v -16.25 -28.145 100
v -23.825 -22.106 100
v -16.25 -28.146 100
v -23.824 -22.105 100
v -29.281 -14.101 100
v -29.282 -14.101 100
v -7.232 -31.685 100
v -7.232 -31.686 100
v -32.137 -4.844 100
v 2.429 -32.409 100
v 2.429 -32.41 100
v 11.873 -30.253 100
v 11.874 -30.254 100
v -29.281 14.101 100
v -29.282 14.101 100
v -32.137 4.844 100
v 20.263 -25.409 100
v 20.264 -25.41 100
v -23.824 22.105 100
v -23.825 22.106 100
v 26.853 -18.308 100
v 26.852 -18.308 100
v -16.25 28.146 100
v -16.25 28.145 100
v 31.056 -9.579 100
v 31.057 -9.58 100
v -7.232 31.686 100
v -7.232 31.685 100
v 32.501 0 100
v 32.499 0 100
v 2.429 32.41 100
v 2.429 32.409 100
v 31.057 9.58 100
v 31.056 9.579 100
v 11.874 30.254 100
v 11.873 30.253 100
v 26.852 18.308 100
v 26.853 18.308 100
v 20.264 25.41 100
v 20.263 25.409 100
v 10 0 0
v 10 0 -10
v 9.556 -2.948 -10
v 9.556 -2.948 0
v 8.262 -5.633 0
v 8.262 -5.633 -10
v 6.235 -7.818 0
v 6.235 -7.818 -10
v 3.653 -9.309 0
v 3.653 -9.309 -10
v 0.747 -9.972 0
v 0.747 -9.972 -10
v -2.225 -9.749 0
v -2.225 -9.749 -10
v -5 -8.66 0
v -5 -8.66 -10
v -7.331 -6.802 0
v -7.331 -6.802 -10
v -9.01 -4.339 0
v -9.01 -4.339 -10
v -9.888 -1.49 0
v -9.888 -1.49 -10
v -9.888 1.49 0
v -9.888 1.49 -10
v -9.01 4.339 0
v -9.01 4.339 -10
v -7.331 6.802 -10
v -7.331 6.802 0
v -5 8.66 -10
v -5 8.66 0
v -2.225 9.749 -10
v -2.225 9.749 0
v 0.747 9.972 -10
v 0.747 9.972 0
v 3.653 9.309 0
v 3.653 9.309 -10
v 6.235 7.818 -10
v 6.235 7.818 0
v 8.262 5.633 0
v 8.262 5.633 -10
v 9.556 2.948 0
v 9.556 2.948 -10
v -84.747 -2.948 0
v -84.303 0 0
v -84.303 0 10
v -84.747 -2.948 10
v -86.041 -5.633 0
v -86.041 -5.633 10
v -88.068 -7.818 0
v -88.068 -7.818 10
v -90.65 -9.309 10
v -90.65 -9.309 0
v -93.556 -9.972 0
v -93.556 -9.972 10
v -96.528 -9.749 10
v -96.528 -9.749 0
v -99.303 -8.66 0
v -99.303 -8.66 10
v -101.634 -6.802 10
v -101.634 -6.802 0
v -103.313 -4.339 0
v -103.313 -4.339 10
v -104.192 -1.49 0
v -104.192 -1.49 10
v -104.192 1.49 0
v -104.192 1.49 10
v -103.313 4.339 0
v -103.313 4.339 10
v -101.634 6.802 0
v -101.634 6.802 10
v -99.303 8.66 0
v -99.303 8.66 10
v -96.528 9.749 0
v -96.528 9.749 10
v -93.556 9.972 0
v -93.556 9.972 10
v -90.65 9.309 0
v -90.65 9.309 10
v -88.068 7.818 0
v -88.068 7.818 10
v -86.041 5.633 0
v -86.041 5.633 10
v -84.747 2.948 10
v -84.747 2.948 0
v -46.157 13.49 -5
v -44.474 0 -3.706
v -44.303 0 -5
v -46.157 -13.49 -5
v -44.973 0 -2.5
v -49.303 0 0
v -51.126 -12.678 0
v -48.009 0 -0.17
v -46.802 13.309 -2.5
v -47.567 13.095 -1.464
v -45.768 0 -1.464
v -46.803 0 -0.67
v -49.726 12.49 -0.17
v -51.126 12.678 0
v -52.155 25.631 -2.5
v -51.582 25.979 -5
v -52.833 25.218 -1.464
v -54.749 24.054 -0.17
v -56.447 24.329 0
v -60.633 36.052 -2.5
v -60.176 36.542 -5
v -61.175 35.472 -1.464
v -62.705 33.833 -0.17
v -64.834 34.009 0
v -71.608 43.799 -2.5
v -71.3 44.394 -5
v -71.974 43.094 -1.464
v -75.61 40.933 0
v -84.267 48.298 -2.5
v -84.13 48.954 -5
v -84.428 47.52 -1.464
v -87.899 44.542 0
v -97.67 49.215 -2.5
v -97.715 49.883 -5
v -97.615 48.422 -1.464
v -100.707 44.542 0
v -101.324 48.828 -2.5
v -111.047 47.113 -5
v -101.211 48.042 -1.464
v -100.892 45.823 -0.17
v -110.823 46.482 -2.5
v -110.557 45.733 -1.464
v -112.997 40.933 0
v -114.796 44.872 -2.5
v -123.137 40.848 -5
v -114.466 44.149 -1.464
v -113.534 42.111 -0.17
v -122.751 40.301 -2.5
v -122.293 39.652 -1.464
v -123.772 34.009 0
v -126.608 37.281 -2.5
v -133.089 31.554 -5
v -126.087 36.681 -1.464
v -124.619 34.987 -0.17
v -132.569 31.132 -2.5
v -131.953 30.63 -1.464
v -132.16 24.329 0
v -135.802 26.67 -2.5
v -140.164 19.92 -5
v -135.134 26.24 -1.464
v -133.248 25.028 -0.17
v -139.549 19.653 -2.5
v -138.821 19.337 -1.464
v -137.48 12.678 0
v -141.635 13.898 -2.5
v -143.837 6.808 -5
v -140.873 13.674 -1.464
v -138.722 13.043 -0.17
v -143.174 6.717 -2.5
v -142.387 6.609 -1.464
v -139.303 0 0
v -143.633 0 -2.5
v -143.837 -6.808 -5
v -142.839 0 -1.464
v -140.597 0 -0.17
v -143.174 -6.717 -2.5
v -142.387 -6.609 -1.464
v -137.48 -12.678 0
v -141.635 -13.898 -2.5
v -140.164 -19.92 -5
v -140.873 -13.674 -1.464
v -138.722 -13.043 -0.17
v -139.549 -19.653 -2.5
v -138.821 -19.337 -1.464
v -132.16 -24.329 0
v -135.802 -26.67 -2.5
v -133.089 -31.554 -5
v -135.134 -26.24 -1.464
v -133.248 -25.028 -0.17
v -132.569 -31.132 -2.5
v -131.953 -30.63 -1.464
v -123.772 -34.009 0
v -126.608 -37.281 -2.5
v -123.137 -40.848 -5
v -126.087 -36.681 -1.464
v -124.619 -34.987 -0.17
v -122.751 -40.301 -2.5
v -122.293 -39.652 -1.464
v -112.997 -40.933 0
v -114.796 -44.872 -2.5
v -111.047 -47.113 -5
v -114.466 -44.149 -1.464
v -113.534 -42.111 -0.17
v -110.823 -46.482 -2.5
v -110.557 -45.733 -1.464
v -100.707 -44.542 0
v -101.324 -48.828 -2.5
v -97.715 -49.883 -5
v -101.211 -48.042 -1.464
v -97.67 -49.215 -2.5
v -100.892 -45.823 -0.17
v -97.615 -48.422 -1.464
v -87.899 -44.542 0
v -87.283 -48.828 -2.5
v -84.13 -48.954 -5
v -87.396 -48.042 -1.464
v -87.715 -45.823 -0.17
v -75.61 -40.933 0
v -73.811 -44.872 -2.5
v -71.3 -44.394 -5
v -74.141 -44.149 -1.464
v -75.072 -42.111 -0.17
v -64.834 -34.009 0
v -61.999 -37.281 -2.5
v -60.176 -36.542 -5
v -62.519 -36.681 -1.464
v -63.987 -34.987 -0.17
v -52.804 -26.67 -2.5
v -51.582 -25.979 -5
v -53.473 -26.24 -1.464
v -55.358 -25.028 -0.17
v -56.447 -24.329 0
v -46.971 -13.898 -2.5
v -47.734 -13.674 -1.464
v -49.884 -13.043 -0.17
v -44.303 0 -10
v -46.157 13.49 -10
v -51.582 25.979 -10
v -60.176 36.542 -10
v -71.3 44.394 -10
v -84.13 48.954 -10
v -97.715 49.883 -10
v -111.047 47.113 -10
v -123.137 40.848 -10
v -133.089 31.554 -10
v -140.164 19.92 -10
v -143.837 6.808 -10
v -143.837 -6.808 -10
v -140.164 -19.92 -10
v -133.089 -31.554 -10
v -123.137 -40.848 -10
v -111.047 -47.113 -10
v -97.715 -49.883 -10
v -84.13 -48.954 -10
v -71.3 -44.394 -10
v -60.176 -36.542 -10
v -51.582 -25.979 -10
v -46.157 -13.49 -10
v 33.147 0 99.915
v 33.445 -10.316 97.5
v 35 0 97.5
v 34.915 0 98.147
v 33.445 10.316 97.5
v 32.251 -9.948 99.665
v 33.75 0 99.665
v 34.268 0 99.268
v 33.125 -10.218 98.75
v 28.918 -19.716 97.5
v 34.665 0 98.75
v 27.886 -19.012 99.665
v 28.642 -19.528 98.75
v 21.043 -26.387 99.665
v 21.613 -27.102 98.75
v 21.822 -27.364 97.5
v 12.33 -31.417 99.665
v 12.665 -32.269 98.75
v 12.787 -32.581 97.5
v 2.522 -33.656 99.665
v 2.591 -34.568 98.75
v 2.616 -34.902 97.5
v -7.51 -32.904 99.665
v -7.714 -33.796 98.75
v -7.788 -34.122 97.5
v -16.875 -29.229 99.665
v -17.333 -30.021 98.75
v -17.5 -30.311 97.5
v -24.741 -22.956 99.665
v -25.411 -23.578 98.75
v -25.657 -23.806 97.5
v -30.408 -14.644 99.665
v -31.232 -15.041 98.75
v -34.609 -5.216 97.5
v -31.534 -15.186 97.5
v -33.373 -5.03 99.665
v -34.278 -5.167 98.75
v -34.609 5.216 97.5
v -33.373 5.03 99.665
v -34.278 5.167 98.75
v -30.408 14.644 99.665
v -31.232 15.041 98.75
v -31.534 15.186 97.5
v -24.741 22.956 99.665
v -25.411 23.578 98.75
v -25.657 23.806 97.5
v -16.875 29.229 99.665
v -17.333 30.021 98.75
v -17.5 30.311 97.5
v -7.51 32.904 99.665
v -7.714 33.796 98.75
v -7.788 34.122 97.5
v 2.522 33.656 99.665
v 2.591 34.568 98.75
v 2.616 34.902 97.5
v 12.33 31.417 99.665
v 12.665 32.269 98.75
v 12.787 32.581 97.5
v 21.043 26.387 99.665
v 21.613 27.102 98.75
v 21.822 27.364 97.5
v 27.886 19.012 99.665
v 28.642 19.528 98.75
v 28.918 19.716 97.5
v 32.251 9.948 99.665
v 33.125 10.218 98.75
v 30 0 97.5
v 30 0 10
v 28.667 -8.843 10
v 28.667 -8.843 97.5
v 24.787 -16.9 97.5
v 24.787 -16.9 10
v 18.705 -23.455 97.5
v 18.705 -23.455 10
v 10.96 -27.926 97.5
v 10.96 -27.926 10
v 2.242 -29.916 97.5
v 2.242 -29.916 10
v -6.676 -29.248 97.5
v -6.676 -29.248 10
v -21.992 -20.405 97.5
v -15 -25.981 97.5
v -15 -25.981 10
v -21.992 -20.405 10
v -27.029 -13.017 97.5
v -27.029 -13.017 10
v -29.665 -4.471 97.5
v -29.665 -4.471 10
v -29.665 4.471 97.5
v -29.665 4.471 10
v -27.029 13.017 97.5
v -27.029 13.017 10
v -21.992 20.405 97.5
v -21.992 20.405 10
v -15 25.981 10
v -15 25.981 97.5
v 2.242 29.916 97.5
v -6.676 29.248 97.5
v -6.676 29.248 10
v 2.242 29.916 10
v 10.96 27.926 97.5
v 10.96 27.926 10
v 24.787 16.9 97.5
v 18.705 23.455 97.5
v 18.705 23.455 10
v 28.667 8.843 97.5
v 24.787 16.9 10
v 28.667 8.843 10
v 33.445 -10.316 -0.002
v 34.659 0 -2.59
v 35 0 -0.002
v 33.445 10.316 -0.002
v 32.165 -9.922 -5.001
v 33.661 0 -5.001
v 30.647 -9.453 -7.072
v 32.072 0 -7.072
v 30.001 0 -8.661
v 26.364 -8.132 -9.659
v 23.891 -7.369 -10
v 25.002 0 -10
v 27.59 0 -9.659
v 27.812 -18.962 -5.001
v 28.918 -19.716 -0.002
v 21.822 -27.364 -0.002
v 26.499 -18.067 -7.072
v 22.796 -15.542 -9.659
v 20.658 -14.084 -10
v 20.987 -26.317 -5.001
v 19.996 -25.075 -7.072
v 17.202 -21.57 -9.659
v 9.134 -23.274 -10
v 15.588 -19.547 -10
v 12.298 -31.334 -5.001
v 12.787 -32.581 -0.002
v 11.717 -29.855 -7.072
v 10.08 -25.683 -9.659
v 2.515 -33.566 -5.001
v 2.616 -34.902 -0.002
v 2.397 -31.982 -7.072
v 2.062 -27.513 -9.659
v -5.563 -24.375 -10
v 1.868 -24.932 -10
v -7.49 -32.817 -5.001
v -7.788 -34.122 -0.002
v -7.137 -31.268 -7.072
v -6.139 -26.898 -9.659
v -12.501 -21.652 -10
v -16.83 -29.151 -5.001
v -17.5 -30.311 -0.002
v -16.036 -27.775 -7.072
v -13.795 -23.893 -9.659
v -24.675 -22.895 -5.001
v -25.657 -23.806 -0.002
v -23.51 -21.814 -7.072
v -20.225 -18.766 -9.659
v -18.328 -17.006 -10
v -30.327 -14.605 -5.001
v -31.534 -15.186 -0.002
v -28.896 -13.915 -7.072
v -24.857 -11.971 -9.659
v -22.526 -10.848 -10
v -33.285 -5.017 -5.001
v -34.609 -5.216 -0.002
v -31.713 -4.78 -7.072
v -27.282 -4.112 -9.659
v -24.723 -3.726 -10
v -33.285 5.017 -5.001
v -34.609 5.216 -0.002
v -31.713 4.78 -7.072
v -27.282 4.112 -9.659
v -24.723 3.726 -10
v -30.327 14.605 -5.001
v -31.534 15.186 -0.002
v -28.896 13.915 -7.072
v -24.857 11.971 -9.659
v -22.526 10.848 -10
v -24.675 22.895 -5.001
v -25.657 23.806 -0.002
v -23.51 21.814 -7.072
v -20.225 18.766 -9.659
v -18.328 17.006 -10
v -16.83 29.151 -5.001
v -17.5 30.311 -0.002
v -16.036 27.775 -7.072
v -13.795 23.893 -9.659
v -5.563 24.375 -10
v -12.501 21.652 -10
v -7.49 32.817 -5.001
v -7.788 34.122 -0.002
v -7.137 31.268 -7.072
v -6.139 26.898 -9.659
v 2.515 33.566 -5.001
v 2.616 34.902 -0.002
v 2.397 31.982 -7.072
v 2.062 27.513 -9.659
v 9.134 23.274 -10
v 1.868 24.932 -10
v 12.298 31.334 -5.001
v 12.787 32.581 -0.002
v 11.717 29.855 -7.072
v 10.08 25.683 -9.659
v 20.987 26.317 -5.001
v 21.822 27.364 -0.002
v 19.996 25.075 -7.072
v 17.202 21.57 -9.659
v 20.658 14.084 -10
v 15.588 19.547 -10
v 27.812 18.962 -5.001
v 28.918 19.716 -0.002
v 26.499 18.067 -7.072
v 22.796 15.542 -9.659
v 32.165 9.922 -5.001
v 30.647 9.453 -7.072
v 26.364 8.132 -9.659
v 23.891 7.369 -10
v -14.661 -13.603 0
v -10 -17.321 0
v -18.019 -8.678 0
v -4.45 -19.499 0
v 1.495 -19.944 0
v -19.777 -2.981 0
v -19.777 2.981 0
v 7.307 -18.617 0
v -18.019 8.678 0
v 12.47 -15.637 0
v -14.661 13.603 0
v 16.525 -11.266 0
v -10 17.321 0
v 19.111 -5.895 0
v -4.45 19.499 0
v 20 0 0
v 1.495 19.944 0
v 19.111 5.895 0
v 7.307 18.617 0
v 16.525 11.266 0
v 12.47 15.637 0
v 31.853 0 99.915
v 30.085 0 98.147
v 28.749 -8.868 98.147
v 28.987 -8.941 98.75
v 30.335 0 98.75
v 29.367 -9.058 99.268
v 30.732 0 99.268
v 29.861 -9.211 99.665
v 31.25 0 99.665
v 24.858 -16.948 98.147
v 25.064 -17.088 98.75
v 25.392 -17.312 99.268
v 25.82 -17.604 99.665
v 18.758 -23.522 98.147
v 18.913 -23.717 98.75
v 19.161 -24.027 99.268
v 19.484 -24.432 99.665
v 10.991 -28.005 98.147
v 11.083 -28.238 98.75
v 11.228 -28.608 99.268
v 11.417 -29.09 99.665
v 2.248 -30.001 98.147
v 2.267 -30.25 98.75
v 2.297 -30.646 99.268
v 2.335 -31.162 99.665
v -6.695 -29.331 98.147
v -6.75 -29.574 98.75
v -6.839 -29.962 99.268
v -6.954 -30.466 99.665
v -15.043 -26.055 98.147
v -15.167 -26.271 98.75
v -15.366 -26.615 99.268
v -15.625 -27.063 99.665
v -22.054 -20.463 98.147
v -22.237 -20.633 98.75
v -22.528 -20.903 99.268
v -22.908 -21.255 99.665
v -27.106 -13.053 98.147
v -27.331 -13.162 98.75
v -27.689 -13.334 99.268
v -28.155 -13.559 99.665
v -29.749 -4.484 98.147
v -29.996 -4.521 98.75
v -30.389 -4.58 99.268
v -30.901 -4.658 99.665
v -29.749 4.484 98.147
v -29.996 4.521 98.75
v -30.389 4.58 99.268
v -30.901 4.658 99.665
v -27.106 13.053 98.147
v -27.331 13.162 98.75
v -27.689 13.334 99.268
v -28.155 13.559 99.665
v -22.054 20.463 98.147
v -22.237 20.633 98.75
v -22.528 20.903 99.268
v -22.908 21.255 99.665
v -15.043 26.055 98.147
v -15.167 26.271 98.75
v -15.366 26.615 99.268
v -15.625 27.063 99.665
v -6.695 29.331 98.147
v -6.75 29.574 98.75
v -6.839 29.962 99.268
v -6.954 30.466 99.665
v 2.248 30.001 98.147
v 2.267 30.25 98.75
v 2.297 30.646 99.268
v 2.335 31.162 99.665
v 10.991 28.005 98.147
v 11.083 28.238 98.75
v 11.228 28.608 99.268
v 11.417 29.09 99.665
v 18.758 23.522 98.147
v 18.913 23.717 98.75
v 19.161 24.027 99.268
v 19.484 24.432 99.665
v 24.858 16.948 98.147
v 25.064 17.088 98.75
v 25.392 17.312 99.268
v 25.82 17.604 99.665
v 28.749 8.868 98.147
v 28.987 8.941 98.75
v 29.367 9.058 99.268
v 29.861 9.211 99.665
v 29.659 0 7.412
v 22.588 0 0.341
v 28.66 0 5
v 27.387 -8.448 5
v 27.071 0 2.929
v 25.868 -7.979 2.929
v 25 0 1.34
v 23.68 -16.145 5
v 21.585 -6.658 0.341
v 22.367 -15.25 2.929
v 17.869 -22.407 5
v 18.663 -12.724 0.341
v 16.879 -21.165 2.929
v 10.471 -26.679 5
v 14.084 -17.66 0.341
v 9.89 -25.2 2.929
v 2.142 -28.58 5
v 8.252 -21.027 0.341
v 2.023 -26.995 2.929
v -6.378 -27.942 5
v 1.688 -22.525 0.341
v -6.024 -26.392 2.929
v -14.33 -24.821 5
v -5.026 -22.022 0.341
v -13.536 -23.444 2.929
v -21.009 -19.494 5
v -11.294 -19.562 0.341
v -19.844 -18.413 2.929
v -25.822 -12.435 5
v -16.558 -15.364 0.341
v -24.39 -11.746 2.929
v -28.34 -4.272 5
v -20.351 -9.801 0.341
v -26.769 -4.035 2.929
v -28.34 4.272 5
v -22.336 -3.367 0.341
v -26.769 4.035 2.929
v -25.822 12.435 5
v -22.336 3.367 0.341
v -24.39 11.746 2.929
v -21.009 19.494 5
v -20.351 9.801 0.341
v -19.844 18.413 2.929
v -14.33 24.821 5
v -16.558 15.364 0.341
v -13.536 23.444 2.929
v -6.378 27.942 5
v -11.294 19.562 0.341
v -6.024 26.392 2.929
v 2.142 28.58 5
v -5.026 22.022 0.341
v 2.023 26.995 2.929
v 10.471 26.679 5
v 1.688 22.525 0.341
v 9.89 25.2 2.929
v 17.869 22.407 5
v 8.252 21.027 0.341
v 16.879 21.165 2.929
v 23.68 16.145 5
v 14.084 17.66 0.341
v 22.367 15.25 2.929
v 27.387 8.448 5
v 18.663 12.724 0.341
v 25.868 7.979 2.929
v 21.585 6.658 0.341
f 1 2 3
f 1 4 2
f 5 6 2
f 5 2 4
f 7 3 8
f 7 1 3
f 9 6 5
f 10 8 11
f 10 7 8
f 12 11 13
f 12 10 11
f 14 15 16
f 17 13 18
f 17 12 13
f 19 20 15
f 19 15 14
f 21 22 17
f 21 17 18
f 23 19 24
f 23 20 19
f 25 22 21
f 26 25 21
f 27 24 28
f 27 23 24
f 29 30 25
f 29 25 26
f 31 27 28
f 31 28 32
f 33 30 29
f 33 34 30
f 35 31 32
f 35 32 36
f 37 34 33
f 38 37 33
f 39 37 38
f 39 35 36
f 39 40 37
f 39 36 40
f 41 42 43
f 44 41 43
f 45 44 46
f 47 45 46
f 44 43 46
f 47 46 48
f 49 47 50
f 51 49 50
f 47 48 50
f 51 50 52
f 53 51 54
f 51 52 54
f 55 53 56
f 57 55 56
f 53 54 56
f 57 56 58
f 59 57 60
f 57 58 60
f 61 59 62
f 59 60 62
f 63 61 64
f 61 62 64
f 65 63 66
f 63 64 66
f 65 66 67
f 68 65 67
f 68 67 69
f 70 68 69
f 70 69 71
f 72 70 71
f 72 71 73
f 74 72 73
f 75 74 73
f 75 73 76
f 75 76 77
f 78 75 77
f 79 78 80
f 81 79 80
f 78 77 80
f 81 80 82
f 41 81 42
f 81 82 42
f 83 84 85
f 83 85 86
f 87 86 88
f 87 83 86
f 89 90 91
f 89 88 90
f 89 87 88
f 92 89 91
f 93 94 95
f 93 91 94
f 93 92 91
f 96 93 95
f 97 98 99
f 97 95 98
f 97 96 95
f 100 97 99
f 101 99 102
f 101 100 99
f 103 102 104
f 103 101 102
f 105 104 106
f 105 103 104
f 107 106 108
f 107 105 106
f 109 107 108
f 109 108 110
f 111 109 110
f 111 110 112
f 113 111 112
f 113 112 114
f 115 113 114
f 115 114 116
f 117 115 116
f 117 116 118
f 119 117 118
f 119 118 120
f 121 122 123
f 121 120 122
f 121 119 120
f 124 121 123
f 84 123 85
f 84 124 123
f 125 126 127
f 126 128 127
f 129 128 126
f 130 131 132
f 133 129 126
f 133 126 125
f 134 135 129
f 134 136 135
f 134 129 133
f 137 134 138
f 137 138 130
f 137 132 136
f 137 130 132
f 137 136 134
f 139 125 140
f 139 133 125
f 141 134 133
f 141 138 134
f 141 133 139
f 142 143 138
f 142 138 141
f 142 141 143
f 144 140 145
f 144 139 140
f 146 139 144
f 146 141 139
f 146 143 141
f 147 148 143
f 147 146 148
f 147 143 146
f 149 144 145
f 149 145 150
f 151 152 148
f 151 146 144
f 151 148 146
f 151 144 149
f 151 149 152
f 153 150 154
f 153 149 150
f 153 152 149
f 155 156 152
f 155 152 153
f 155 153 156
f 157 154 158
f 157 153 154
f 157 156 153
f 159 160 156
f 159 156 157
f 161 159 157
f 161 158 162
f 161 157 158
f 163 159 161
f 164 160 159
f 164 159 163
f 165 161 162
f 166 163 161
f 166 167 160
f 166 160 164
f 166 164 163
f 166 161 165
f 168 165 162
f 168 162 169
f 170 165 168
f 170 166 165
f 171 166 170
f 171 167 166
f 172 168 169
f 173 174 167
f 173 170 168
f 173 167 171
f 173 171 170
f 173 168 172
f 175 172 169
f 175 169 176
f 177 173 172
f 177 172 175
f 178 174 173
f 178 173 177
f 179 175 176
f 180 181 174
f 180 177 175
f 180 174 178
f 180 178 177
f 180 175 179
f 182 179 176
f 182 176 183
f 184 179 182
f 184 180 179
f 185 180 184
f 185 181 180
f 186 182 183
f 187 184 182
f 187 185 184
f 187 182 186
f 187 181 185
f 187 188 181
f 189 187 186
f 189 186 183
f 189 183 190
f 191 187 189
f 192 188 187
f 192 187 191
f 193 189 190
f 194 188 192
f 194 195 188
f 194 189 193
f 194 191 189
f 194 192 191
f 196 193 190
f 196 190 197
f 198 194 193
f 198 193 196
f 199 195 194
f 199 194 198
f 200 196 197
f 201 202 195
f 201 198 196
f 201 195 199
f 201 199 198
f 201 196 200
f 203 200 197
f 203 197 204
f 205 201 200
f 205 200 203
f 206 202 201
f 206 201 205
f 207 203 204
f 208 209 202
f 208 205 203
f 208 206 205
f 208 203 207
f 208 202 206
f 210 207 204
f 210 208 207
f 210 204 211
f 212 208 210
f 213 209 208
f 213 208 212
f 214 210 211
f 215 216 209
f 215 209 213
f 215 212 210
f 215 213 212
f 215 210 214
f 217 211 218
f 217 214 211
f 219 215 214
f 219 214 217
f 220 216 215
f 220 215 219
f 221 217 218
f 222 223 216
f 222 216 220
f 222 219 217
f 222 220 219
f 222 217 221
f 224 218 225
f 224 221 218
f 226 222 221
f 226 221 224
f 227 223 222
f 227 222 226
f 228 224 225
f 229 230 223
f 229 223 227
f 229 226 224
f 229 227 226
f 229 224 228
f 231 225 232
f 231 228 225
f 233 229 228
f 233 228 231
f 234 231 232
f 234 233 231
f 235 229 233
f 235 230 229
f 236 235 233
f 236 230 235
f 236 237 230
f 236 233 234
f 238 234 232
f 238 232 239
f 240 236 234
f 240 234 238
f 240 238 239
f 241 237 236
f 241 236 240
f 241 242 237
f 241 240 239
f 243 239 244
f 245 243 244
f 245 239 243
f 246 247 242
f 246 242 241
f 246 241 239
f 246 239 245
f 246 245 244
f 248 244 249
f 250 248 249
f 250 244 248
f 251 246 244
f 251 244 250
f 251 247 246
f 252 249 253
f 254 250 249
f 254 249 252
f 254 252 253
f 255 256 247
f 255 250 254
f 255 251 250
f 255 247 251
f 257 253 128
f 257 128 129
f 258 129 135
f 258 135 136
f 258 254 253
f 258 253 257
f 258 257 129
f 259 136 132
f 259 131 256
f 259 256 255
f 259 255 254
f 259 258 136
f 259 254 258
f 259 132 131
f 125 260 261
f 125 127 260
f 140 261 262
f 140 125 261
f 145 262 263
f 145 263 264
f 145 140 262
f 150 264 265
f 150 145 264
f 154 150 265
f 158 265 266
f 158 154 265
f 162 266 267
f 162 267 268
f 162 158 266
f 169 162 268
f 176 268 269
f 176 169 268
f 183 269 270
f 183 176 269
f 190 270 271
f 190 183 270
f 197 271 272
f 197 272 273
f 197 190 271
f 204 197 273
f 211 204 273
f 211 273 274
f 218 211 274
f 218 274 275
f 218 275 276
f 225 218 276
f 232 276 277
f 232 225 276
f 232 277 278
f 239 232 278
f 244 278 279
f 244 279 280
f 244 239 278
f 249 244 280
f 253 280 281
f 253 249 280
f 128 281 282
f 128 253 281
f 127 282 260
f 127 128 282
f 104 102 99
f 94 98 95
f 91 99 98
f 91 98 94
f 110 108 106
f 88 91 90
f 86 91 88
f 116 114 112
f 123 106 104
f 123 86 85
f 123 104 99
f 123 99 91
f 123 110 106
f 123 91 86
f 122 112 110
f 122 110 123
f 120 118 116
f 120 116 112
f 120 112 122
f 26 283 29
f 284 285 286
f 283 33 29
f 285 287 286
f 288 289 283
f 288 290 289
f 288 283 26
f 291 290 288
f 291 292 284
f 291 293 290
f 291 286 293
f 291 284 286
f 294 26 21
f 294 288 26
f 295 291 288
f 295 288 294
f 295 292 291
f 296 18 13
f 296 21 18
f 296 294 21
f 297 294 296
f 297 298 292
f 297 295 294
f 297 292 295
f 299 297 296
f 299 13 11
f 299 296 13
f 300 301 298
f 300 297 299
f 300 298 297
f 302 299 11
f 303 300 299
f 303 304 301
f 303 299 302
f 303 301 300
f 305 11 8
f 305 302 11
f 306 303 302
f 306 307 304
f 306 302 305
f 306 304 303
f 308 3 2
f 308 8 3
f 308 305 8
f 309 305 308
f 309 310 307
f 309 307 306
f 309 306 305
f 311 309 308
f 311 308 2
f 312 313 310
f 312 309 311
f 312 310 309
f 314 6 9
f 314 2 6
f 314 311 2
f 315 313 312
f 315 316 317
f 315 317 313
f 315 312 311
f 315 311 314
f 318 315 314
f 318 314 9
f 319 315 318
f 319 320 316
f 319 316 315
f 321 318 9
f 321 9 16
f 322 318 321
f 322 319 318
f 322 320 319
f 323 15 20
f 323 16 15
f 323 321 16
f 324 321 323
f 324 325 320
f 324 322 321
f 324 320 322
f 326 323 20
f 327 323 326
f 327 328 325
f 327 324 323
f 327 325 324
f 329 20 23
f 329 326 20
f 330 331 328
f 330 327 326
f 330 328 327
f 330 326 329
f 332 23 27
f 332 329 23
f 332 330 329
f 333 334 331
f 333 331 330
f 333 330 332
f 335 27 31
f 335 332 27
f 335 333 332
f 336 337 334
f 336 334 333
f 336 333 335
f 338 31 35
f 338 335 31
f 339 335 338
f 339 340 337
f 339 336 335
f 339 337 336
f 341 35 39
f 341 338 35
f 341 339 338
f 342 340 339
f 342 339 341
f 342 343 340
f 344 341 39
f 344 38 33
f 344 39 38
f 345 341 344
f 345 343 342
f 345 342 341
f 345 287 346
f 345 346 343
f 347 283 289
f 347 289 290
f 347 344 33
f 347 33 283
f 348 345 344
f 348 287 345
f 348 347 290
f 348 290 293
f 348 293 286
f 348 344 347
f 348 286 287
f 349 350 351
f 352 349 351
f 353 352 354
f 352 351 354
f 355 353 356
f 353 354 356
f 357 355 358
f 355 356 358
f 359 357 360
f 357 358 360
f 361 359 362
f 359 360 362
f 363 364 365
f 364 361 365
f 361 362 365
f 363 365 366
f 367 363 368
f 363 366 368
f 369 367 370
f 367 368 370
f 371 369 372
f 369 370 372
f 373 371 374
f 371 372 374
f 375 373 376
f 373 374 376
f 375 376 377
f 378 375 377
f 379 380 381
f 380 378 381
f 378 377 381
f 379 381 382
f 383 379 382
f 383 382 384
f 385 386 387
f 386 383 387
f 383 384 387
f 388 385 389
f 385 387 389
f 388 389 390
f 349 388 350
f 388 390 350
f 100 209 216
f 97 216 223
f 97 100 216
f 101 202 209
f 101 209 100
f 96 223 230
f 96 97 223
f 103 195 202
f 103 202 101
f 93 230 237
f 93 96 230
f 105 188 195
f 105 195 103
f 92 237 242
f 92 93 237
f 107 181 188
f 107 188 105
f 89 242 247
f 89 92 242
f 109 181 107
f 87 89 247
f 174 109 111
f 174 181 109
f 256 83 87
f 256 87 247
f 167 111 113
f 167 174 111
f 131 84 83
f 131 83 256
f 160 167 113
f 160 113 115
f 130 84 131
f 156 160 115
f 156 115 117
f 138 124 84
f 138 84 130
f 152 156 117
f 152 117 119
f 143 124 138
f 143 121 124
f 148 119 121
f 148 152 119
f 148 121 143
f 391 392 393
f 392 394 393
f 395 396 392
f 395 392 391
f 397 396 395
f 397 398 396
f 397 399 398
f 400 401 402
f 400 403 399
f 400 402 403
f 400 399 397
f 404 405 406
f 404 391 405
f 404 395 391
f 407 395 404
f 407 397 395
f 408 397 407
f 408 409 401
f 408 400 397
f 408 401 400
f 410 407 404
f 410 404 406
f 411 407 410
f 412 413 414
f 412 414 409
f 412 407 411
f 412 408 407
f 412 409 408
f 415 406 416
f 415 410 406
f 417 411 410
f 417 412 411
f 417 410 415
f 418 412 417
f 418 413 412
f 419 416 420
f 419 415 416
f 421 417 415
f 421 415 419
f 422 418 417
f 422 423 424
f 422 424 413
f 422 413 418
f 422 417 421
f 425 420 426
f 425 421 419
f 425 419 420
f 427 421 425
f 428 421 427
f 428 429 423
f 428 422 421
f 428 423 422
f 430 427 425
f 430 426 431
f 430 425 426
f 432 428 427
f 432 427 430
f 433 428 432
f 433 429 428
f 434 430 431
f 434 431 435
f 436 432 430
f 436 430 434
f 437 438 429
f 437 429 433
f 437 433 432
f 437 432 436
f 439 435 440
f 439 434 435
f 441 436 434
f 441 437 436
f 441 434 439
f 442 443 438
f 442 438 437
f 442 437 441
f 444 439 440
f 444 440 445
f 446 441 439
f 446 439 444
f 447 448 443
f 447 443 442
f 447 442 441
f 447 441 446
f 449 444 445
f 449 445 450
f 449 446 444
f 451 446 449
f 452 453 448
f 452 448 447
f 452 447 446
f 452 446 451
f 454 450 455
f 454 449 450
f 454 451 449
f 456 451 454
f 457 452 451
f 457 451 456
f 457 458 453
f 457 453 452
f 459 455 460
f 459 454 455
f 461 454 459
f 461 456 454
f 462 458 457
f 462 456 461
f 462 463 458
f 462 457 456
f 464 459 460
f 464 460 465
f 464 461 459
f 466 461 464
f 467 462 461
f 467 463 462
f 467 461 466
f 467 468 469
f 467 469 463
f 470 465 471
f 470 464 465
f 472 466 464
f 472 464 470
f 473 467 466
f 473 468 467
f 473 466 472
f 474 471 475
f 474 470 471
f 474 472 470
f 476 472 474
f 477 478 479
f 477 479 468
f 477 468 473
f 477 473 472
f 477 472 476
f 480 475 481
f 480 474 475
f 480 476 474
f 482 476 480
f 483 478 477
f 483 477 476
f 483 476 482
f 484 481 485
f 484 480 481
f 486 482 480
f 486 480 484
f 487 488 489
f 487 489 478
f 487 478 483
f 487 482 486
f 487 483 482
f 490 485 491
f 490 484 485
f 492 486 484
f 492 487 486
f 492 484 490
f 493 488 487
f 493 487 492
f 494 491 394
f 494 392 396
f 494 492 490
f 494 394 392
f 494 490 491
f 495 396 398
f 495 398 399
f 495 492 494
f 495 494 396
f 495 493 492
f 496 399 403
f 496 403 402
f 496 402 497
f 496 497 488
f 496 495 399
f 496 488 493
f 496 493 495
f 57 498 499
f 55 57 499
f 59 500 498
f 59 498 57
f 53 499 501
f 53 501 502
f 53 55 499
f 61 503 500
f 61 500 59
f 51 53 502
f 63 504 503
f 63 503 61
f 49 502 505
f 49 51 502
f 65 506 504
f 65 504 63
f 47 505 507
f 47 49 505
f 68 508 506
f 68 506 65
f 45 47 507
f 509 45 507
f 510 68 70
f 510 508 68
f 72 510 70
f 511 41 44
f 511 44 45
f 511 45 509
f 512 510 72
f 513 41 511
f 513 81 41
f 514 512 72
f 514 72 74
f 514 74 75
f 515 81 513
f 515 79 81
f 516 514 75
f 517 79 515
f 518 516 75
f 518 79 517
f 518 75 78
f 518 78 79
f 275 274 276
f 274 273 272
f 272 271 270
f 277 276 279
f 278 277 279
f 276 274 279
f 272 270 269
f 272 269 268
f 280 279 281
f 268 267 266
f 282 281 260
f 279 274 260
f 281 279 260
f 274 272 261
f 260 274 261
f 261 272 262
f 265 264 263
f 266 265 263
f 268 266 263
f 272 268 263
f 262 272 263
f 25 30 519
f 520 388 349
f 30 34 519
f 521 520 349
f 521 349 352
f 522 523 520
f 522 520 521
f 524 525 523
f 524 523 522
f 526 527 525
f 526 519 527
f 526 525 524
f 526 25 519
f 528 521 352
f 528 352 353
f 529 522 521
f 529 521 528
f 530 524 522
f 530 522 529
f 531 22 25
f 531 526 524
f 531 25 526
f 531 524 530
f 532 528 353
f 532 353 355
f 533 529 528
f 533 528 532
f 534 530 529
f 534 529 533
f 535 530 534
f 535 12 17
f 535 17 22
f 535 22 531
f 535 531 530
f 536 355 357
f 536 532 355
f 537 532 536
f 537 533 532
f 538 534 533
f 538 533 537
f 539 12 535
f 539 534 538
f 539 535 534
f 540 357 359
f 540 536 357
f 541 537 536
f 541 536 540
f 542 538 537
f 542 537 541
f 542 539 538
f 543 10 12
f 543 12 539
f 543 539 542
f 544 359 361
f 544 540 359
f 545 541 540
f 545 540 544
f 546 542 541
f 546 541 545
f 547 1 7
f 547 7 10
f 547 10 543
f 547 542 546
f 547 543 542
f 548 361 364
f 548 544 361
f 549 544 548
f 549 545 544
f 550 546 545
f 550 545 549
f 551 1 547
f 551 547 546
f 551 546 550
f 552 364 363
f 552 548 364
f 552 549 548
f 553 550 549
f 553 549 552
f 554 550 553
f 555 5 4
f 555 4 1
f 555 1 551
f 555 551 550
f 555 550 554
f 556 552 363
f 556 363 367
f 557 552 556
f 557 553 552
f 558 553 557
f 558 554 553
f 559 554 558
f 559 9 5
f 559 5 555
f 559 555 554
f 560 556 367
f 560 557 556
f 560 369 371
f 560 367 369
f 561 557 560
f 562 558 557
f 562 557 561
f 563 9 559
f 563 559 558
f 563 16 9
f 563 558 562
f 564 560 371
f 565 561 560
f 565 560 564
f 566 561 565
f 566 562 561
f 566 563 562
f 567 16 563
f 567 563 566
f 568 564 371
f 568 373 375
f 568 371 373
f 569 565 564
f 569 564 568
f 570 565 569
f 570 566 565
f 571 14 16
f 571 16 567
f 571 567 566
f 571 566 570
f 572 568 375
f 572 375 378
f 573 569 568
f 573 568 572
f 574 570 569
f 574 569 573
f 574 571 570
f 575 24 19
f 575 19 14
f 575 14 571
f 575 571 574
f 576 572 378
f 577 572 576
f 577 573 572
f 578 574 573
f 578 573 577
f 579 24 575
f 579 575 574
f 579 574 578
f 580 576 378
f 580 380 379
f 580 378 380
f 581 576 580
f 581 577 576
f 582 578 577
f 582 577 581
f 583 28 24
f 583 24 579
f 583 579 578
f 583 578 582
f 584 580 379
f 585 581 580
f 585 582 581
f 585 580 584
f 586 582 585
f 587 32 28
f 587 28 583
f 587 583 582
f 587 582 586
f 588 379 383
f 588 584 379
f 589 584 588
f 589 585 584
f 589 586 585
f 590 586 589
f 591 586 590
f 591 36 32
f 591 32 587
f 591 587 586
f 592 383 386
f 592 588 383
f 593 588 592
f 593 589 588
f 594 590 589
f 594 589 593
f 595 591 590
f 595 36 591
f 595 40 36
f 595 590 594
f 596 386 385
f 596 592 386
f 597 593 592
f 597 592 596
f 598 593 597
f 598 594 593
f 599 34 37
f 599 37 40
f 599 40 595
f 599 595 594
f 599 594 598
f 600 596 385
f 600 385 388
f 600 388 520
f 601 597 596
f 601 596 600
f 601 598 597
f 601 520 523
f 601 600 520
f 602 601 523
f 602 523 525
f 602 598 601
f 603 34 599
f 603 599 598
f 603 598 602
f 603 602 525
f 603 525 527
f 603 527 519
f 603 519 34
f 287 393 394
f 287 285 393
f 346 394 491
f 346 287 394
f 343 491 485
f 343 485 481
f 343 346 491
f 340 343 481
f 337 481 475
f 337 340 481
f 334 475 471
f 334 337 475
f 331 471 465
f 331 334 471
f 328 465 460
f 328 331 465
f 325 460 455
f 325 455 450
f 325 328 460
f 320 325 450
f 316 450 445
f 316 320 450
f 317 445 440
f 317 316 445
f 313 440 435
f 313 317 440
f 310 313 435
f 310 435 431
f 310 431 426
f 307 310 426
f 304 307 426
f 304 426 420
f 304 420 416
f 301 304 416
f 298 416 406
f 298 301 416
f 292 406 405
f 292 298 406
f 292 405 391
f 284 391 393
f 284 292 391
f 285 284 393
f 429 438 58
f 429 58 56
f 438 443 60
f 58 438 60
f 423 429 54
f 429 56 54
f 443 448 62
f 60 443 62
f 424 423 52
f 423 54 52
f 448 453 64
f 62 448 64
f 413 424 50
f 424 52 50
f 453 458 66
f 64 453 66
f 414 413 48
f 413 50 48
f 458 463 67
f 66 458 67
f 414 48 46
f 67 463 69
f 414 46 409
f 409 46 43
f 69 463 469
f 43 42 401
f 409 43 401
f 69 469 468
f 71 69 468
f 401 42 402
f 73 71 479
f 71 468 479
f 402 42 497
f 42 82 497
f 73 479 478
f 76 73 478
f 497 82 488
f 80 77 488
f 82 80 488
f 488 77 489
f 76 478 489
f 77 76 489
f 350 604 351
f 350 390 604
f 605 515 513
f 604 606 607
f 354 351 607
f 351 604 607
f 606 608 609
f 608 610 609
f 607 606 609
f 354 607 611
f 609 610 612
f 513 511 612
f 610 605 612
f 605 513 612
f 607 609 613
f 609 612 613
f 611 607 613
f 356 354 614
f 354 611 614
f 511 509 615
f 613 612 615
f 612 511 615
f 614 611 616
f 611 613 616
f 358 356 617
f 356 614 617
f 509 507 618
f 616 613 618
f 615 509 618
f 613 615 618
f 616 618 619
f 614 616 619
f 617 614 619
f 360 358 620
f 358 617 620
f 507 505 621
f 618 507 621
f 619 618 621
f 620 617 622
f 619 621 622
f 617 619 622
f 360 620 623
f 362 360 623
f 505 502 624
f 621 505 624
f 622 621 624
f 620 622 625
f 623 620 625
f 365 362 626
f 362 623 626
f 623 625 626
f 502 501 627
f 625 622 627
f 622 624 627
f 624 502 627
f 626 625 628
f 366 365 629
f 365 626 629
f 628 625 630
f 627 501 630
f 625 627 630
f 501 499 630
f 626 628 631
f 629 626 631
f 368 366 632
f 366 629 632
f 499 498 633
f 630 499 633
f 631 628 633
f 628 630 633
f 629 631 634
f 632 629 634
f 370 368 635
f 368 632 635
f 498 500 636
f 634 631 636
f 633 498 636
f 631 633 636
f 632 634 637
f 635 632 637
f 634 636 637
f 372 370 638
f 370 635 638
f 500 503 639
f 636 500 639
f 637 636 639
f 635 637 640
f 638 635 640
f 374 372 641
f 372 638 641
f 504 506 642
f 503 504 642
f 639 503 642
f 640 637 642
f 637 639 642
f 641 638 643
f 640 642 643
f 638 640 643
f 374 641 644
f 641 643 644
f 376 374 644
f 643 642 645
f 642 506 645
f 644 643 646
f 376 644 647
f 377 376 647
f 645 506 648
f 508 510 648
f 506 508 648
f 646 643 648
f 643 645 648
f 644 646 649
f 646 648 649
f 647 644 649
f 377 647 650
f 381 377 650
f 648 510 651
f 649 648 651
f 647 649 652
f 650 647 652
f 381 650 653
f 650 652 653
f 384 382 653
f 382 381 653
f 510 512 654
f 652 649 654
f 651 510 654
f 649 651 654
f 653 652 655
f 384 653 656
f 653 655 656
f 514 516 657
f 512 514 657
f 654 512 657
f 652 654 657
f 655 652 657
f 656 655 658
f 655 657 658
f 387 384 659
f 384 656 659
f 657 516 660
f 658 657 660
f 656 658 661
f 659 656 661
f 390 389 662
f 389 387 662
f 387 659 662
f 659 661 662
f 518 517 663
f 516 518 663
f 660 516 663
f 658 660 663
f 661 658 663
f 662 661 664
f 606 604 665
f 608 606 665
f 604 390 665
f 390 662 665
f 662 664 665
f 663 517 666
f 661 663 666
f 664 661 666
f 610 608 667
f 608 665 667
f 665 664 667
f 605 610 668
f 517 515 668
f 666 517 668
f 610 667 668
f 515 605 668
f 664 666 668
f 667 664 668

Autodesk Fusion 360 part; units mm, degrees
sketch "Sketch1" plane through (0, 0, 0) normal (0, 0, 1) x (1, 0, 0)
  circle A0 centre (0, 0) radius 30
  circle A1 centre (0, 0) radius 35
  dimension "d1" = 60
  dimension "d2" = 70
extrude "Extrude1" add sketch "Sketch1" along normal blind 100 makes body 1
extrude "Extrude2" add sketch "Sketch1" against normal blind 10 contours A0 | A1 bodies 1
fillet "Fillet1" radius 10 1 edges at (-32.6315, 12.6565, -10) on bodies 1
fillet "Fillet2" radius 10 1 edges at (-27.9698, 10.8485, 0) on bodies 1
sketch "Sketch2" plane through (0, 0, -10) normal (0, 0, -1) x (1, 0, 0)
  circle A0 centre (0, 0) radius 25
  circle A1 centre (0, 0) radius 10
  dimension "d11" = 20
extrude "Extrude3" cut sketch "Sketch2" against normal blind 45 contours A1 bodies 1
sketch "Sketch3" plane through (0, 0, 0) normal (0, 0, 1) x (1, 0, 0)
  circle A0 centre (-94.3032, 0) radius 50
  circle A1 centre (-94.3032, 0) radius 10
  dimension "d14" = 100
  dimension "d15" = 20
extrude "Extrude4" add sketch "Sketch3" against normal blind 10 separate body contours A0 | A1 makes body 2
extrude "Extrude5" add sketch "Sketch3" along normal blind 10 contours A1 bodies 2
fillet "Fillet3" radius 2.5 2 edges at (-32.6315, -12.6565, 100) (-27.9698, 10.8485, 100) on bodies 1
fillet "Fillet4" radius 5 1 edges at (-140.9195, -18.0808, 0) on bodies 2
